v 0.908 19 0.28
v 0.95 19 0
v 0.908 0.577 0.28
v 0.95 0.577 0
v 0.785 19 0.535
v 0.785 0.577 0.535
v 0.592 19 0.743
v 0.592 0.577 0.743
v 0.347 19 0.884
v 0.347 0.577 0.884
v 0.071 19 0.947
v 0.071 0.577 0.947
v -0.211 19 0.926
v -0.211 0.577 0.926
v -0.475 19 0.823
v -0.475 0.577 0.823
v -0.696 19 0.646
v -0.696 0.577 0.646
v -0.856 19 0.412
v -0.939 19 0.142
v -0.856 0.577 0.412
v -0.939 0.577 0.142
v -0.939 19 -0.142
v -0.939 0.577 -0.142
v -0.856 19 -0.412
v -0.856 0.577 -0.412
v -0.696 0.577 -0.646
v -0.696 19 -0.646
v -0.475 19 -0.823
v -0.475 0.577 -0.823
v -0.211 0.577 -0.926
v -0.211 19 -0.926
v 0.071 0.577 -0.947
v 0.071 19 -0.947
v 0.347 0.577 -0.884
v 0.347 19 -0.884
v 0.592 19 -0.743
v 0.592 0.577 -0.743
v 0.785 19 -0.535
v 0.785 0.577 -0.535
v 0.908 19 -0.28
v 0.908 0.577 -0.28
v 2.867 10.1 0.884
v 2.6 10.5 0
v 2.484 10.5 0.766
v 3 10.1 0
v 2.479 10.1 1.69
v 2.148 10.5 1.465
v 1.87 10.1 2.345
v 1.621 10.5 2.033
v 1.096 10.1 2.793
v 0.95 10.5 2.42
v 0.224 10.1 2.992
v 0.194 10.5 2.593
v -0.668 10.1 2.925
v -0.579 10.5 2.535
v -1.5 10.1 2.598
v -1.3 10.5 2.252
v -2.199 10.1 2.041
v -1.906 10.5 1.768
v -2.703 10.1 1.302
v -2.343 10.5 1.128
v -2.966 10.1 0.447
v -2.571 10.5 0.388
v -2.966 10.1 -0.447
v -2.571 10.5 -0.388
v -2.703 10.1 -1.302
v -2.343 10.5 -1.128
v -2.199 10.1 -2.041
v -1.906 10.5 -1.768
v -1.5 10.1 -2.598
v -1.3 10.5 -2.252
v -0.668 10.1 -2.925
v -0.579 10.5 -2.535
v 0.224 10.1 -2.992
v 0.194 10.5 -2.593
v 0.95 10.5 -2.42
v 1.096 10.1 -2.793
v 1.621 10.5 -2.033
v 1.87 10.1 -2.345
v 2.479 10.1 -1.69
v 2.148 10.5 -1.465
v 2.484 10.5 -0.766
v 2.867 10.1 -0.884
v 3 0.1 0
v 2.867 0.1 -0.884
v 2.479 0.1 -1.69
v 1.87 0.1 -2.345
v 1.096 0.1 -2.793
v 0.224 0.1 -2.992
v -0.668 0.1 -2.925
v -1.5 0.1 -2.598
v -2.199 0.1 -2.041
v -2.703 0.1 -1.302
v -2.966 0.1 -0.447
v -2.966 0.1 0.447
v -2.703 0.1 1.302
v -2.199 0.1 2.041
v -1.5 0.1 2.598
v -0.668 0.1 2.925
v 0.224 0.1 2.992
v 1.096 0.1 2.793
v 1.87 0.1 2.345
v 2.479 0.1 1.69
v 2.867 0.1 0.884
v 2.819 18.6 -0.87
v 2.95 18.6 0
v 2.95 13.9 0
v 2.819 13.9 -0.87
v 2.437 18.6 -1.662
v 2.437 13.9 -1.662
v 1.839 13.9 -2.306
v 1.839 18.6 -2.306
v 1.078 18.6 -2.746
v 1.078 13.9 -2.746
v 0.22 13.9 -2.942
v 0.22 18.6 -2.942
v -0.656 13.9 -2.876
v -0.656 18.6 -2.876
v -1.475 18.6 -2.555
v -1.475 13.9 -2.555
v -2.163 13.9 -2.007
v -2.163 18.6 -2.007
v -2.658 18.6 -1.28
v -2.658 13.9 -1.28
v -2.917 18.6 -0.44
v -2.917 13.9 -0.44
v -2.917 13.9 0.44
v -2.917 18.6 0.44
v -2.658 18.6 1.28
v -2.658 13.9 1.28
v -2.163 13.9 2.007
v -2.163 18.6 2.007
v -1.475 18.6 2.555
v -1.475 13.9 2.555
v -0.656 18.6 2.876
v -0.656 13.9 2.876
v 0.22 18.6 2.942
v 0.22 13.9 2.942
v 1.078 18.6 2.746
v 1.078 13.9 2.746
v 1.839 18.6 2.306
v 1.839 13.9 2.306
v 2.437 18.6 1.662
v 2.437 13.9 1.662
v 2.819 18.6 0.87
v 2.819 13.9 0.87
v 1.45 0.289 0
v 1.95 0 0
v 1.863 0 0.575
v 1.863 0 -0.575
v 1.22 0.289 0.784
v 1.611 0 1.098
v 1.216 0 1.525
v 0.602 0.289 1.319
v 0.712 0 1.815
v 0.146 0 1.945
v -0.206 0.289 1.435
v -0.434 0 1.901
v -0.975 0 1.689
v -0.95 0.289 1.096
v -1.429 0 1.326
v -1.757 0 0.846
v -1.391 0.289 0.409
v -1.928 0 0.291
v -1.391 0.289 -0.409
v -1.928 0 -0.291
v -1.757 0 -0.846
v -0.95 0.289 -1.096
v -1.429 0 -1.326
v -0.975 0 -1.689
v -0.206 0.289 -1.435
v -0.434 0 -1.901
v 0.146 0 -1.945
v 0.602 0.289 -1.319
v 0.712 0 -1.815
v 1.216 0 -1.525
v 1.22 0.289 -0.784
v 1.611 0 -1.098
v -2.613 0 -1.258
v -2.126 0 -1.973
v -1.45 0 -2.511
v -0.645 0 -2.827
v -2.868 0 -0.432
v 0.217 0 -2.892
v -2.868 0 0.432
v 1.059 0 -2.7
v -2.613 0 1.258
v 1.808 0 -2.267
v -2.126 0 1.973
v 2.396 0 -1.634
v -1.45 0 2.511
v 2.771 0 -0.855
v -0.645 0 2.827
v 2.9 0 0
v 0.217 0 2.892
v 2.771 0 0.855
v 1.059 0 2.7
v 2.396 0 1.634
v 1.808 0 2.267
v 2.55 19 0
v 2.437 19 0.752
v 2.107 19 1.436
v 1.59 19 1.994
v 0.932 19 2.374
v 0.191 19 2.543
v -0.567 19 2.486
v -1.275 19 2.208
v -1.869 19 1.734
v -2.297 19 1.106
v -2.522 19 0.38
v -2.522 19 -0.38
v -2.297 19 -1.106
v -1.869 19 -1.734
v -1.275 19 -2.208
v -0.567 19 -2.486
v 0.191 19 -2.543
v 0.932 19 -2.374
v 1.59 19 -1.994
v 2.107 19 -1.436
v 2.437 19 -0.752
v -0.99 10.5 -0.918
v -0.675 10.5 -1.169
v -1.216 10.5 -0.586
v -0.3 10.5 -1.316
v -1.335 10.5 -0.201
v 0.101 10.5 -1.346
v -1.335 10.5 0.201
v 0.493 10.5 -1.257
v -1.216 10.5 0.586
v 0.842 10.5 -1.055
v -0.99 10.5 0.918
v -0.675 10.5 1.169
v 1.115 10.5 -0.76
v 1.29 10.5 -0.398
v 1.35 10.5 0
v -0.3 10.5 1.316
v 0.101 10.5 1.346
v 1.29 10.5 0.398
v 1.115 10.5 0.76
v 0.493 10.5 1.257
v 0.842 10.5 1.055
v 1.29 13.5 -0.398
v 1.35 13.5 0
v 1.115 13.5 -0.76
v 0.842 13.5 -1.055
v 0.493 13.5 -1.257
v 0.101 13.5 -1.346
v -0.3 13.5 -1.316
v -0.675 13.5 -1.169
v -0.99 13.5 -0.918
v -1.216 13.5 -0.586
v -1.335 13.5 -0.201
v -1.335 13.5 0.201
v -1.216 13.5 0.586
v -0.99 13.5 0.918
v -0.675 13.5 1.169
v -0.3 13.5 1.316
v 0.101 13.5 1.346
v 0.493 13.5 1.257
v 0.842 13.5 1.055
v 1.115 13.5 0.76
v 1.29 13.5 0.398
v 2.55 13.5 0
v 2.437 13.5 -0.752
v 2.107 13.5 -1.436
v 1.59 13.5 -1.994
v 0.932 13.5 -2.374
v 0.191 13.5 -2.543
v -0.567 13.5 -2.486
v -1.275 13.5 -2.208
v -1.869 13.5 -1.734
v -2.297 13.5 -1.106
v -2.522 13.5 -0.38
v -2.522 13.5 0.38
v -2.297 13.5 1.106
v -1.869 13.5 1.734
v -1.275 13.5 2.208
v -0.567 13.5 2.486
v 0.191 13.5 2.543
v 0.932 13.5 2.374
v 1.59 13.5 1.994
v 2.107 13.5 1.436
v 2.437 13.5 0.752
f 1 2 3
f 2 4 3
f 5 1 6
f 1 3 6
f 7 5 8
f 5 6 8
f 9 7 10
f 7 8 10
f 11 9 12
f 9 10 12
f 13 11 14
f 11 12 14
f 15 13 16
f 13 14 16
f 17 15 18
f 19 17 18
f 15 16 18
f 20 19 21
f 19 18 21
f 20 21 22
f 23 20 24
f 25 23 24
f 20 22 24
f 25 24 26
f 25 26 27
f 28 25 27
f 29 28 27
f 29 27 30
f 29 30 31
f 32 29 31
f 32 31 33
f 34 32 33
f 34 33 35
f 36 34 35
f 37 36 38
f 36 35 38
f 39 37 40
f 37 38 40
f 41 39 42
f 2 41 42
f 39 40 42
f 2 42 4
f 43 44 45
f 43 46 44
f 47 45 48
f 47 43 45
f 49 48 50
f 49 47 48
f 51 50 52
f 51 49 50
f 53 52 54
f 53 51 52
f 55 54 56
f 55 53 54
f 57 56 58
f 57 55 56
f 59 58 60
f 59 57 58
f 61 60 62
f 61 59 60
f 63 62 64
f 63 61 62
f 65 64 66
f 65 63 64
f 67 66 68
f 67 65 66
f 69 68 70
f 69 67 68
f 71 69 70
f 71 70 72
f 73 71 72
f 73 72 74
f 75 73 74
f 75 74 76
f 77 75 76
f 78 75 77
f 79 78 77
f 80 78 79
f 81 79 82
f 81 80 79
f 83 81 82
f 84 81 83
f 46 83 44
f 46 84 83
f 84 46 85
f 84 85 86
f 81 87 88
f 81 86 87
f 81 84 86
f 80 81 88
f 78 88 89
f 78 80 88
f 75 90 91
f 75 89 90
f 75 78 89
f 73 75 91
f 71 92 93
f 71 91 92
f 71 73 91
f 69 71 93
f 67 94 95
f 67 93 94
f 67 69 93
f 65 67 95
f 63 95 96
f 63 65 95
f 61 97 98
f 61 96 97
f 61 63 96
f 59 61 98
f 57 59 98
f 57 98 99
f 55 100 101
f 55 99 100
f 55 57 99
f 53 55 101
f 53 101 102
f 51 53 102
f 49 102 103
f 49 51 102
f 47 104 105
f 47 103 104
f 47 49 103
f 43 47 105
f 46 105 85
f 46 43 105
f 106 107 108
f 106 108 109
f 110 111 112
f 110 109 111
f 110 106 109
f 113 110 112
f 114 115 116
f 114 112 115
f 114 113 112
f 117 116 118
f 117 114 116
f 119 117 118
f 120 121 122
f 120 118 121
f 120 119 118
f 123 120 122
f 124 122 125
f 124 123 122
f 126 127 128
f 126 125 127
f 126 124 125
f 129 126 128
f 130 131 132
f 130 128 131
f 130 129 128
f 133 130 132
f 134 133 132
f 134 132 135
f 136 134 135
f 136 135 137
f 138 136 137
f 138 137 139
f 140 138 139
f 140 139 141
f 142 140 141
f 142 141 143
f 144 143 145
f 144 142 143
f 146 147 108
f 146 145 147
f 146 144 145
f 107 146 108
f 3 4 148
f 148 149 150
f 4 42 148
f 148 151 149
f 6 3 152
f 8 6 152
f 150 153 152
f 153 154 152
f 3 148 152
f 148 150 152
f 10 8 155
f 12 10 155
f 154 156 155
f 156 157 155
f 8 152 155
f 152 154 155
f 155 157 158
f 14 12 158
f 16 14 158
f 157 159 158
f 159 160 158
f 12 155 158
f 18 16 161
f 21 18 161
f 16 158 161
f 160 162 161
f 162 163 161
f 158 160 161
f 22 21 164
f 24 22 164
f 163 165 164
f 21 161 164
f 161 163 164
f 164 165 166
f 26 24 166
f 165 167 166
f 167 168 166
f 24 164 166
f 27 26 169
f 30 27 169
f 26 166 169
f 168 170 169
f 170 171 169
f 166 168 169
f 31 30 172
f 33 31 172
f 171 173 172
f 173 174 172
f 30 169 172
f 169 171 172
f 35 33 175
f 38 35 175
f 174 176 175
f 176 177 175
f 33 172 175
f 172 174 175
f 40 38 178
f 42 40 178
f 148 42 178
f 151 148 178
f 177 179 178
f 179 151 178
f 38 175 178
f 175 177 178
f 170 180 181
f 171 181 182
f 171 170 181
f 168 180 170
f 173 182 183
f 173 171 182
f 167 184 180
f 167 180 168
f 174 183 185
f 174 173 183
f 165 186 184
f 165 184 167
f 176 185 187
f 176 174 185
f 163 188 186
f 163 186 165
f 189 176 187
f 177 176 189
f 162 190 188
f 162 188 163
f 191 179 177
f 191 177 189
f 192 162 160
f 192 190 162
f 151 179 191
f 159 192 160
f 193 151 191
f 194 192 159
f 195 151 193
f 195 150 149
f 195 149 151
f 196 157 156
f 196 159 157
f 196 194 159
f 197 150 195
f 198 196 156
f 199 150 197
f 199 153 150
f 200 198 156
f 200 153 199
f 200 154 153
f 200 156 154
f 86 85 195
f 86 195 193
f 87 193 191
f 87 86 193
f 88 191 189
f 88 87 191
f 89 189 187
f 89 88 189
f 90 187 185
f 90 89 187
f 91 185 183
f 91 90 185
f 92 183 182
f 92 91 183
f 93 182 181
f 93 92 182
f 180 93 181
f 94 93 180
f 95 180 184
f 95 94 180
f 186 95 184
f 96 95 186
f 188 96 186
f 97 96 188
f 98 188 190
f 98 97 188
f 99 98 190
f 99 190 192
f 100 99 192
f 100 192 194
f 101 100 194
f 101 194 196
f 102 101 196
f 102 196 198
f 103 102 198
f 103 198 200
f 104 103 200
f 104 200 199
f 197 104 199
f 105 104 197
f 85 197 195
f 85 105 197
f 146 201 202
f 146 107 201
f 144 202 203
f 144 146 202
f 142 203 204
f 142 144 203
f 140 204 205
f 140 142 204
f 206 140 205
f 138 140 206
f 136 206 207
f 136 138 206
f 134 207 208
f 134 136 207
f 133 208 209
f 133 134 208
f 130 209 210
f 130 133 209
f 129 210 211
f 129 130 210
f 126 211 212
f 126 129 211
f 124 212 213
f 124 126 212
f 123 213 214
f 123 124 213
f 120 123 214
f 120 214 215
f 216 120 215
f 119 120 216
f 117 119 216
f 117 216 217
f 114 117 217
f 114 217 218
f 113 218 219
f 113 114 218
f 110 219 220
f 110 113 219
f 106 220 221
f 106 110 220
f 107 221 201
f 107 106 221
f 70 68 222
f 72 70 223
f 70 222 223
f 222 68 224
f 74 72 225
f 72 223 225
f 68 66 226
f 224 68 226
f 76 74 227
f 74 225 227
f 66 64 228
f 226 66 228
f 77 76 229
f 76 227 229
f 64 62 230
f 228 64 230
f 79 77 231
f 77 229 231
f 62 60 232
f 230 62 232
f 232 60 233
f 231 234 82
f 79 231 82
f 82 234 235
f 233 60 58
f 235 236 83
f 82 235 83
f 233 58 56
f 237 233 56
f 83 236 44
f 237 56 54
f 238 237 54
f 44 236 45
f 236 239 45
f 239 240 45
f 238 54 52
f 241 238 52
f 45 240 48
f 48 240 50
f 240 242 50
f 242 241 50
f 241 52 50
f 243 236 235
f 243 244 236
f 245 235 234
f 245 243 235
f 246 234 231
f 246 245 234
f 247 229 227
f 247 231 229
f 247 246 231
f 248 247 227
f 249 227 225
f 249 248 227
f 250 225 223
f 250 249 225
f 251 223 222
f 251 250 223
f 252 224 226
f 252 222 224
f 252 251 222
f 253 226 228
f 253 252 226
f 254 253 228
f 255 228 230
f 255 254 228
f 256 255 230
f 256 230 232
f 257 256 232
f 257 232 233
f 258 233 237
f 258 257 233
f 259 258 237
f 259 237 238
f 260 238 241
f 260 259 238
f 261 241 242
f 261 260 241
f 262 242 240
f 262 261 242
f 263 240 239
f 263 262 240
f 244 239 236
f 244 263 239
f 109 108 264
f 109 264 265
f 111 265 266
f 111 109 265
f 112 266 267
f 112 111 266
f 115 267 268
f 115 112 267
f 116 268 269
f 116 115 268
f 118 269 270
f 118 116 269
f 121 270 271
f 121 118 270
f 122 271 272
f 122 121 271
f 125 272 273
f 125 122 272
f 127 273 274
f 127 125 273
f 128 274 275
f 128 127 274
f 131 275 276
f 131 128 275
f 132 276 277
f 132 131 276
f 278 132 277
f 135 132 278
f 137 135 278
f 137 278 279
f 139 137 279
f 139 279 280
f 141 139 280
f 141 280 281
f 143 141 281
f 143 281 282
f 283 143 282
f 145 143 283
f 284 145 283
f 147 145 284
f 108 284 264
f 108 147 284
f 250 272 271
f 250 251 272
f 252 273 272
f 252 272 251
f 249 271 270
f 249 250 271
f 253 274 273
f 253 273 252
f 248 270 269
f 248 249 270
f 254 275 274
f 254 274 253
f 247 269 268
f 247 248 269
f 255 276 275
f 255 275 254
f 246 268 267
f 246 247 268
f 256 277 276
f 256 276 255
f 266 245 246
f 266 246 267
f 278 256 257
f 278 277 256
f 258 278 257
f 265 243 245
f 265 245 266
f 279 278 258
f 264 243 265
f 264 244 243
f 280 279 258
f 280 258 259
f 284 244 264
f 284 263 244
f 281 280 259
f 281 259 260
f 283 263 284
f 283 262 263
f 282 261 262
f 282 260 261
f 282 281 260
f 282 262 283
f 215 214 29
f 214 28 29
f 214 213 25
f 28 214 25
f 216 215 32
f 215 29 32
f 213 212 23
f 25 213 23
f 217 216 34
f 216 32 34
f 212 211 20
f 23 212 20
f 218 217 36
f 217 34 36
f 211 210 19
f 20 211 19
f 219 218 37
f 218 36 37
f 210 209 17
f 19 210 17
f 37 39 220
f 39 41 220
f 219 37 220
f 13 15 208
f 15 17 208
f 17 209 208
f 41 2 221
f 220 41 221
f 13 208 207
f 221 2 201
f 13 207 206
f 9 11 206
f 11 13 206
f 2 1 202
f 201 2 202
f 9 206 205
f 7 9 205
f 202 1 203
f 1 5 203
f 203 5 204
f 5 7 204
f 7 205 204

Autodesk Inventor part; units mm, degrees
ref_plane "YZ Plane" through (0, 0, 0) normal (1, 0, 0) x (0, 1, 0)
ref_plane "XZ Plane" through (0, 0, 0) normal (0, 1, 0) x (-1, 0, 0)
ref_plane "XY Plane" through (0, 0, 0) normal (0, 0, 1) x (1, 0, 0)
sketch "Sketch1" plane through (0, 0, 0) normal (0, 0, 1) x (1, 0, 0)
  line L0 (0, 0) -> (2.9, 0)
  line L1 (3, 0.1) -> (3, 10.5)
  line L2 (3, 10.5) -> (1.35, 10.5)
  line L3 (1.35, 10.5) -> (1.35, 13.5)
  line L4 (1.35, 13.5) -> (2.95, 13.5)
  line L5 (2.95, 13.5) -> (2.95, 19)
  line L6 (2.95, 19) -> (0.95, 19)
  line L7 (0.95, 19) -> (0.95, 0)
  line L8 (2.9, 0) -> (3, 0.1)
  line L9 (0.95, 0) -> (1.95, 0)
  line L10 (1.95, 0) -> (0.95, 0.5774)
  line L11 (0, 17.1506) -> (0, 0) construction
  dimension "d15" = 2.9
  dimension "d16" = 10.4
  dimension "d17" = 1.65
  dimension "d18" = 1.6
  dimension "d19" = 5.5
  dimension "d20" = 90
  dimension "d21" = 2
  dimension "d22" = 90
  dimension "d23" = 1
  dimension "d24" = 30
  dimension "d25" = 19
revolve "Revolution1" add sketch "Sketch1" angle 360 about axis through (0, 17.1506, 0) along (0, -1, 0) contours L10 L7 L6 L5 L4 L3 L2 L1 L8 L0
thread "Thread1" size "M6x1" class "6g" standard "ANSI Metric M Profile" length 5.3
chamfer "Chamfer1" distance 0.4 angle 45 2 edges at (-2.95, 19, 0) (-2.95, 13.5, 0)
chamfer "Chamfer2" distance 0.4 angle 45 1 edges at (-3, 10.5, 0)
properties part number "heatbreak ender 3s1" material "Titanium"
